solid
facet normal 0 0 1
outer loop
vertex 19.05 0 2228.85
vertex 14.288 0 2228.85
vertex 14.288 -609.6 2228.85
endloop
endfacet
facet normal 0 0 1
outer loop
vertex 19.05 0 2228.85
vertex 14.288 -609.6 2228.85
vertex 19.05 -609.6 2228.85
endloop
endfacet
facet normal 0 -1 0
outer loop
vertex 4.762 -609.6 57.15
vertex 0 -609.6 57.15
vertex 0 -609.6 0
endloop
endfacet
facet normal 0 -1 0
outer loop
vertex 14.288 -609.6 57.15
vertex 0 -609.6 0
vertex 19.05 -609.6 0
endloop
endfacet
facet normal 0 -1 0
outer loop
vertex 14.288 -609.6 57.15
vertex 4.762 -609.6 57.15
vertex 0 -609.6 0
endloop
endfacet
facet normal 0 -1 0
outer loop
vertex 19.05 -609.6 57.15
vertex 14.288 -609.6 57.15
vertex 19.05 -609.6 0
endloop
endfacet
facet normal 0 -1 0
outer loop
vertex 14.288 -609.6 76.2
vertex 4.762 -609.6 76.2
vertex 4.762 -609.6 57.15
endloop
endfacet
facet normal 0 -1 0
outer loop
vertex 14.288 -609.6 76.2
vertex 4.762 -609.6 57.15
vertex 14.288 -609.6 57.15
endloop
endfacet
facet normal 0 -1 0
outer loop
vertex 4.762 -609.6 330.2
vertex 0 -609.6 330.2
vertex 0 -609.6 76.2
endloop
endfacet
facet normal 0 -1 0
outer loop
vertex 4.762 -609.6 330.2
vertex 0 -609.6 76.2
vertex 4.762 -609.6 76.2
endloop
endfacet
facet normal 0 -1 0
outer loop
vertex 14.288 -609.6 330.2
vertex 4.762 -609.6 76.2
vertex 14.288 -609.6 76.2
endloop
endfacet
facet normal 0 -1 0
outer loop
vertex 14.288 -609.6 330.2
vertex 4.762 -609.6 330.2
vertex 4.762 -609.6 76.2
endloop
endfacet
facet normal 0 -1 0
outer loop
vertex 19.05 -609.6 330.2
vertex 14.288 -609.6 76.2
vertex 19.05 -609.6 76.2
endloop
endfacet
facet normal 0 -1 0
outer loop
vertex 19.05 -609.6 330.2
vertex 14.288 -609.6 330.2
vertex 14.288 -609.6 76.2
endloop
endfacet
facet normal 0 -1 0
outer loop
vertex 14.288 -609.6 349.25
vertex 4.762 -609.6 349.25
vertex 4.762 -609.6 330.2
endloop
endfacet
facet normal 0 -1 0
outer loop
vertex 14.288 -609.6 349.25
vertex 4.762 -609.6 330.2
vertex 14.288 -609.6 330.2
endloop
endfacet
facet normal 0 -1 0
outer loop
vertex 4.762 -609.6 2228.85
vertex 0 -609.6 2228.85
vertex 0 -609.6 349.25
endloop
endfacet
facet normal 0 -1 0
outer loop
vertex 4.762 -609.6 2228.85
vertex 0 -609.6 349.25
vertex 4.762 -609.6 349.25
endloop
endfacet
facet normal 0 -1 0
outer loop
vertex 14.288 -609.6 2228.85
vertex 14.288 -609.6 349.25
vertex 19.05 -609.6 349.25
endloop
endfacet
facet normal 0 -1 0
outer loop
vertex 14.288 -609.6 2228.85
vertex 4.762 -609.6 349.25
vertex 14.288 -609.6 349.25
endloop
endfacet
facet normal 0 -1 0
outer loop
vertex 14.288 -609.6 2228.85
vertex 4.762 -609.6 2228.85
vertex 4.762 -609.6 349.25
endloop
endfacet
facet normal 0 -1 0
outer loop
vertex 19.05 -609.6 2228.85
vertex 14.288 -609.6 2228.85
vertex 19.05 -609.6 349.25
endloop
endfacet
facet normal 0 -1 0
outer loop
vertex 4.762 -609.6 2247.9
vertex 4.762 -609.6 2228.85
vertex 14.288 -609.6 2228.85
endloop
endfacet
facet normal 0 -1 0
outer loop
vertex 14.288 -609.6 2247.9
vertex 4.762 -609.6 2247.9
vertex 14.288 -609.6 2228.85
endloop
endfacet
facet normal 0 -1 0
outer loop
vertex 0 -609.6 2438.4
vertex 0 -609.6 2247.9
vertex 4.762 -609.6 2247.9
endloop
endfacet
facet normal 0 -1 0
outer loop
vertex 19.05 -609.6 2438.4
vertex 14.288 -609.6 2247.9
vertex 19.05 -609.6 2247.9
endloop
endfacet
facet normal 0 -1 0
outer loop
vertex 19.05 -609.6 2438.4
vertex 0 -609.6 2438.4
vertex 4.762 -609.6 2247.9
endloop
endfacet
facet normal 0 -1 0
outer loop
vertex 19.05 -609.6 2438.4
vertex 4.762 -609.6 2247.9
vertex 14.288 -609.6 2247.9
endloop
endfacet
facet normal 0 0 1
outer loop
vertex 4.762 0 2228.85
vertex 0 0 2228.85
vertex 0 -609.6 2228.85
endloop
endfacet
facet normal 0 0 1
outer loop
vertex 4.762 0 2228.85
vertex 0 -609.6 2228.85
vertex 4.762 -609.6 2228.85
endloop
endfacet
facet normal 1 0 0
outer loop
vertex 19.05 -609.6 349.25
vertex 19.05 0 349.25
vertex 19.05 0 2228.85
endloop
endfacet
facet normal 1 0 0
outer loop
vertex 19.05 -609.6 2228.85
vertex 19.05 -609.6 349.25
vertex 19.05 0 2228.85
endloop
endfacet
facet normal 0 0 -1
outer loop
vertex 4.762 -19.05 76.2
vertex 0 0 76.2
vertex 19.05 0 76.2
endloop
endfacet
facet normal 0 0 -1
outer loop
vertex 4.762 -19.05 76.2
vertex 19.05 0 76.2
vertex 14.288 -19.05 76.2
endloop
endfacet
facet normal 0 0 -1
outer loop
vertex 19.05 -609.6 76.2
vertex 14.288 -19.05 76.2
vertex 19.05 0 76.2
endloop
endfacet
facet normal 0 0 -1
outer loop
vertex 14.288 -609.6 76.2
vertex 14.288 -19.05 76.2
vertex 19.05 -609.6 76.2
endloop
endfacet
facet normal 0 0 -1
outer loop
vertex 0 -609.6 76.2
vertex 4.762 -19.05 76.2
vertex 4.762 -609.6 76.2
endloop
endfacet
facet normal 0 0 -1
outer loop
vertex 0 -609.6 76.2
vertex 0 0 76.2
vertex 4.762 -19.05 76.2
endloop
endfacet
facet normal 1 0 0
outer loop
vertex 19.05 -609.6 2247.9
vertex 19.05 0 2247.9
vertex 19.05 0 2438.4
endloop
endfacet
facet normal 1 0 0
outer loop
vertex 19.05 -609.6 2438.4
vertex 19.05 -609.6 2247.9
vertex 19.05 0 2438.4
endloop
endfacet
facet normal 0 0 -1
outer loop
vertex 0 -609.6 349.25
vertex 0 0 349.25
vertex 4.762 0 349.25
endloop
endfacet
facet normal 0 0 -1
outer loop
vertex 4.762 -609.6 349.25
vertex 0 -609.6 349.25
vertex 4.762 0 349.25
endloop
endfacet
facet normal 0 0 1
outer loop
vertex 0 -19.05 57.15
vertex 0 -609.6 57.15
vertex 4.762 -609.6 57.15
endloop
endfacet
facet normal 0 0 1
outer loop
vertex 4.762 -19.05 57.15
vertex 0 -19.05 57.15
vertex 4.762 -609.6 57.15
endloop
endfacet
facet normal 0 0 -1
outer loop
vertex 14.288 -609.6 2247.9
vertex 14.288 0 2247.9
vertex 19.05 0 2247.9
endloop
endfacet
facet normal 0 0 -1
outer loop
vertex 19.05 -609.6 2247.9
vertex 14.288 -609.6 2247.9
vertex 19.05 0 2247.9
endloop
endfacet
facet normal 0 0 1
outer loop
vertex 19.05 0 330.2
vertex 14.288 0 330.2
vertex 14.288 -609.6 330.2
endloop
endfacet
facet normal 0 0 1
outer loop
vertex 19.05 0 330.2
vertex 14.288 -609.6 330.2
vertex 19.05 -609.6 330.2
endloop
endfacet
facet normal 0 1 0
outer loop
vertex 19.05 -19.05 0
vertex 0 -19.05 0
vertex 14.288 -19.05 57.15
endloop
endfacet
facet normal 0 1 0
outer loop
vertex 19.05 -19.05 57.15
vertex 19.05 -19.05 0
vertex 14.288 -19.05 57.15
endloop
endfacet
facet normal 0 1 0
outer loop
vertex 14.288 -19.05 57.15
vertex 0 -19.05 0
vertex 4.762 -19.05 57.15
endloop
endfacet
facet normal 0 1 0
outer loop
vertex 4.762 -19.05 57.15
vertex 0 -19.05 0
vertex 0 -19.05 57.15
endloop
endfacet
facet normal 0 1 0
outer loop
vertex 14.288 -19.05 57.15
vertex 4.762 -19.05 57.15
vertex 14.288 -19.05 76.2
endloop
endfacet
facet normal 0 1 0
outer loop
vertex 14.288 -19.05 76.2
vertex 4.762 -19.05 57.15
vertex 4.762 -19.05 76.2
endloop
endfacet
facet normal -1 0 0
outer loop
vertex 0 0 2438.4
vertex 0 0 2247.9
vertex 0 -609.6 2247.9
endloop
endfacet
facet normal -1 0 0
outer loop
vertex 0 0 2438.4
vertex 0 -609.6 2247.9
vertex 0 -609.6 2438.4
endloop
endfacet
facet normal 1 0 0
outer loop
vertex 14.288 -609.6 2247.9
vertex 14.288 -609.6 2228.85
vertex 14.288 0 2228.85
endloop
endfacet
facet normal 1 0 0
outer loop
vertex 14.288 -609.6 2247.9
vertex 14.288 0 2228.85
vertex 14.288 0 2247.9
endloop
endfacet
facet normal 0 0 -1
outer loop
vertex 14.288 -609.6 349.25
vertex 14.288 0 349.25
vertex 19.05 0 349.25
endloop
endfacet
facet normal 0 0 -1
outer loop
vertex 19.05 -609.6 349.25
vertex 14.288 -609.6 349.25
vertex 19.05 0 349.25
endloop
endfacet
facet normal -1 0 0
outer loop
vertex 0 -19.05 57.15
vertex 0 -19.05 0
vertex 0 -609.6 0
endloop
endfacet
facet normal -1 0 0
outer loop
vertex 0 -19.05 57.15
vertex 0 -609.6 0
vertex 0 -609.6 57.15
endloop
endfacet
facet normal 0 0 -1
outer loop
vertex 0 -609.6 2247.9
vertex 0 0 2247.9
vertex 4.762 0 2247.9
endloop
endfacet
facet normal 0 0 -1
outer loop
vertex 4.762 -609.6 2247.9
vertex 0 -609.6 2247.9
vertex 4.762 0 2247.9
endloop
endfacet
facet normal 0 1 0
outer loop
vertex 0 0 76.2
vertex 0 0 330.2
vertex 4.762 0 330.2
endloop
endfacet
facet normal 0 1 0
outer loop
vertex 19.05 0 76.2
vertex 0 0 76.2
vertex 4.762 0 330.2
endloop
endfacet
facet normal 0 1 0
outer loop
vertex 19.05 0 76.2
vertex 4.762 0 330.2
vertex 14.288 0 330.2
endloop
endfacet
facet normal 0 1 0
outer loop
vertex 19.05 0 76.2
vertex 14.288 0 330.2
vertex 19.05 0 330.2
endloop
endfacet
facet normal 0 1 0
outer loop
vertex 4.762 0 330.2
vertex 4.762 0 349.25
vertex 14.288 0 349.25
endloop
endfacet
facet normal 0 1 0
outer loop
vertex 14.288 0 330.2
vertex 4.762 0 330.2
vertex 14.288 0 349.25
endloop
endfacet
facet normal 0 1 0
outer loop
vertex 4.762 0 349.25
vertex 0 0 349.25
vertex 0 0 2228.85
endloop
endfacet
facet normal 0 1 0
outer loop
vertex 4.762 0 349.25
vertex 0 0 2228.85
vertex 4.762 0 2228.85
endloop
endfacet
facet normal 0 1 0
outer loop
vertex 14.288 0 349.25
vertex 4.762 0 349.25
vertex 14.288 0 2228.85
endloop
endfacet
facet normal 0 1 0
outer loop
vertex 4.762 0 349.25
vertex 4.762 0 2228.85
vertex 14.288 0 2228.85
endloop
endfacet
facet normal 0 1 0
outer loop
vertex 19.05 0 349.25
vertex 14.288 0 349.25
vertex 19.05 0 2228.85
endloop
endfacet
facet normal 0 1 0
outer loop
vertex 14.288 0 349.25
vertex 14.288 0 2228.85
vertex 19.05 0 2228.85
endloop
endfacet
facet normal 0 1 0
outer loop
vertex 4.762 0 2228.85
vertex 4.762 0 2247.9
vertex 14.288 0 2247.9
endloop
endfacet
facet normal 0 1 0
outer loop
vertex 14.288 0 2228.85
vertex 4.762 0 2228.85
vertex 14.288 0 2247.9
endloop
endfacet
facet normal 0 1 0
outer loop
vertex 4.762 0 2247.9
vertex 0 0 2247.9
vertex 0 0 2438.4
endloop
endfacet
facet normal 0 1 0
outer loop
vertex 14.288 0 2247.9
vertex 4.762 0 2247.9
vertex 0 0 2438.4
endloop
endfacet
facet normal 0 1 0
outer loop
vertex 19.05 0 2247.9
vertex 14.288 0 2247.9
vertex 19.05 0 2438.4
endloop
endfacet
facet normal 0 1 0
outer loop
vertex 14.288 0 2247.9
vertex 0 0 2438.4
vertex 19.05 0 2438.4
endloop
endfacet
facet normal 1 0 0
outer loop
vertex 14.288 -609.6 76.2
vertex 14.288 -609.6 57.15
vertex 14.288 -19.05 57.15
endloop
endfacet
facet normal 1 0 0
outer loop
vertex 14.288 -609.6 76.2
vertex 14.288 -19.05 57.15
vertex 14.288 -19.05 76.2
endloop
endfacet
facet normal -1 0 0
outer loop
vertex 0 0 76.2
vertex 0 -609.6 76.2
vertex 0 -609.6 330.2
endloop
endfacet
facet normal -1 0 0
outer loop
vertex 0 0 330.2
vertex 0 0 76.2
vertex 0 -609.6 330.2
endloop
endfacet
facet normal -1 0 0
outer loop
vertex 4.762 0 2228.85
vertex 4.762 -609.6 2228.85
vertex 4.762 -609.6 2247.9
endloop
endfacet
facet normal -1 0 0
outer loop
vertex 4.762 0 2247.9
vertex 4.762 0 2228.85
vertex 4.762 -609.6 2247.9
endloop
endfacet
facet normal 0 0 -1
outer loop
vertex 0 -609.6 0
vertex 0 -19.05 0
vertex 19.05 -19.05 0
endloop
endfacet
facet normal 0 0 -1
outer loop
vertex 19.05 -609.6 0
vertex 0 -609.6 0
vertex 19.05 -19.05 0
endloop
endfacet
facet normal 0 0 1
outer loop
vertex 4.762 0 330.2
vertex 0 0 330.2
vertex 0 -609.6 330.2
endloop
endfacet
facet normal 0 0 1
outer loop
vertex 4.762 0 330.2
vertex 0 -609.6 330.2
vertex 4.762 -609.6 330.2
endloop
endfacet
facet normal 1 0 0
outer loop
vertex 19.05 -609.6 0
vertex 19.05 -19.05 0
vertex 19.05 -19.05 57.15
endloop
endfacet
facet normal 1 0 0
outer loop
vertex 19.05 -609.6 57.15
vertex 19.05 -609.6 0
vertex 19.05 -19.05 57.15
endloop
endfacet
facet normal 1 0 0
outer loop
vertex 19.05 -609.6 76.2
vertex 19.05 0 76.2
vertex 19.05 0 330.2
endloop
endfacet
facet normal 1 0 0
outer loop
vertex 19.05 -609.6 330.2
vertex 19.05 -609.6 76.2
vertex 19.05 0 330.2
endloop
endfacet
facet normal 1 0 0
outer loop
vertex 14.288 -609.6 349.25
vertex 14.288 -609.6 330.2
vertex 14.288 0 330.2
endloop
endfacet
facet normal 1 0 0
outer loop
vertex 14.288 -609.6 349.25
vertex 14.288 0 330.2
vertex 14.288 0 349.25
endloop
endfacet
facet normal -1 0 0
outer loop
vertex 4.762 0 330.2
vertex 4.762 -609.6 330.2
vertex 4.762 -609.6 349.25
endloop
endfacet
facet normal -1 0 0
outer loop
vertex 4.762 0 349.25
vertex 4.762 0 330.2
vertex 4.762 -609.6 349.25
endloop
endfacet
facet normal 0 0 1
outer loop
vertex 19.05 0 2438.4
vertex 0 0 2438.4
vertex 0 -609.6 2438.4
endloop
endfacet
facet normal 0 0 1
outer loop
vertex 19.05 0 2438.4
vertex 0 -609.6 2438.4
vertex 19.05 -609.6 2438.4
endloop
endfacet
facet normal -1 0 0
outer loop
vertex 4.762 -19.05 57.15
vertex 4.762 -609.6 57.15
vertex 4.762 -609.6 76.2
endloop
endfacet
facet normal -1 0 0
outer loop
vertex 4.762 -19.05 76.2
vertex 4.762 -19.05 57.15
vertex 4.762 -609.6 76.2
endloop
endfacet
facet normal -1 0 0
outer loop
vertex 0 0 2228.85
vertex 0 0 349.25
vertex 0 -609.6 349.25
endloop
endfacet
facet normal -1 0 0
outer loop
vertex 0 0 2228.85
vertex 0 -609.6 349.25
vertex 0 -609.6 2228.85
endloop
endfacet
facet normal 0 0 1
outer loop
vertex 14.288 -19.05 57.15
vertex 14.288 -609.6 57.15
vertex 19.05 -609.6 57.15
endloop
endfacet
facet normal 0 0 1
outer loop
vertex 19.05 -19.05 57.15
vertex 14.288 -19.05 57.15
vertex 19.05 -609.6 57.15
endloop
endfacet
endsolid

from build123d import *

# Parameters (mm, degrees)
F0_W     = 19.05
F0_H     = 2438.4
F1_DEPTH = 609.6
F2_W     = 19.05
F2_H     = 76.2
F3_DEPTH = 19.051
F4_W     = 4.7625
F4_H     = 19.05
F5_DEPTH = 609.601


with BuildPart() as f1:
    # F0 (on Front) → F1 (new body)
    with BuildSketch(Plane.XZ):
        with Locations((9.525, 1219.2)):
            Rectangle(F0_W, F0_H)
    extrude(amount=F1_DEPTH)

    # F2 (on face) → F3 (cut, through all)
    with BuildSketch(Plane(origin=(0, 0, 0), x_dir=(0, -1, 0), z_dir=(-1, 0, 0))):
        with Locations((9.525, 38.1)):
            Rectangle(F2_W, F2_H)
    extrude(amount=-F3_DEPTH, mode=Mode.SUBTRACT)

    # F4 (on face) → F5 (cut, through all)
    with BuildSketch(Plane.XZ.offset(609.6)):
        with Locations((2.38125, 66.675)):
            Rectangle(F4_W, F4_H)
        with Locations((16.66875, 66.675)):
            Rectangle(F4_W, F4_H)
        with Locations((2.38125, 2238.375)):
            Rectangle(F4_W, F4_H)
        with Locations((16.66875, 2238.375)):
            Rectangle(F4_W, F4_H)
        with Locations((16.66875, 339.725)):
            Rectangle(F4_W, F4_H)
        with Locations((2.38125, 339.725)):
            Rectangle(F4_W, F4_H)
    extrude(amount=-F5_DEPTH, mode=Mode.SUBTRACT)


solid = f1.part
